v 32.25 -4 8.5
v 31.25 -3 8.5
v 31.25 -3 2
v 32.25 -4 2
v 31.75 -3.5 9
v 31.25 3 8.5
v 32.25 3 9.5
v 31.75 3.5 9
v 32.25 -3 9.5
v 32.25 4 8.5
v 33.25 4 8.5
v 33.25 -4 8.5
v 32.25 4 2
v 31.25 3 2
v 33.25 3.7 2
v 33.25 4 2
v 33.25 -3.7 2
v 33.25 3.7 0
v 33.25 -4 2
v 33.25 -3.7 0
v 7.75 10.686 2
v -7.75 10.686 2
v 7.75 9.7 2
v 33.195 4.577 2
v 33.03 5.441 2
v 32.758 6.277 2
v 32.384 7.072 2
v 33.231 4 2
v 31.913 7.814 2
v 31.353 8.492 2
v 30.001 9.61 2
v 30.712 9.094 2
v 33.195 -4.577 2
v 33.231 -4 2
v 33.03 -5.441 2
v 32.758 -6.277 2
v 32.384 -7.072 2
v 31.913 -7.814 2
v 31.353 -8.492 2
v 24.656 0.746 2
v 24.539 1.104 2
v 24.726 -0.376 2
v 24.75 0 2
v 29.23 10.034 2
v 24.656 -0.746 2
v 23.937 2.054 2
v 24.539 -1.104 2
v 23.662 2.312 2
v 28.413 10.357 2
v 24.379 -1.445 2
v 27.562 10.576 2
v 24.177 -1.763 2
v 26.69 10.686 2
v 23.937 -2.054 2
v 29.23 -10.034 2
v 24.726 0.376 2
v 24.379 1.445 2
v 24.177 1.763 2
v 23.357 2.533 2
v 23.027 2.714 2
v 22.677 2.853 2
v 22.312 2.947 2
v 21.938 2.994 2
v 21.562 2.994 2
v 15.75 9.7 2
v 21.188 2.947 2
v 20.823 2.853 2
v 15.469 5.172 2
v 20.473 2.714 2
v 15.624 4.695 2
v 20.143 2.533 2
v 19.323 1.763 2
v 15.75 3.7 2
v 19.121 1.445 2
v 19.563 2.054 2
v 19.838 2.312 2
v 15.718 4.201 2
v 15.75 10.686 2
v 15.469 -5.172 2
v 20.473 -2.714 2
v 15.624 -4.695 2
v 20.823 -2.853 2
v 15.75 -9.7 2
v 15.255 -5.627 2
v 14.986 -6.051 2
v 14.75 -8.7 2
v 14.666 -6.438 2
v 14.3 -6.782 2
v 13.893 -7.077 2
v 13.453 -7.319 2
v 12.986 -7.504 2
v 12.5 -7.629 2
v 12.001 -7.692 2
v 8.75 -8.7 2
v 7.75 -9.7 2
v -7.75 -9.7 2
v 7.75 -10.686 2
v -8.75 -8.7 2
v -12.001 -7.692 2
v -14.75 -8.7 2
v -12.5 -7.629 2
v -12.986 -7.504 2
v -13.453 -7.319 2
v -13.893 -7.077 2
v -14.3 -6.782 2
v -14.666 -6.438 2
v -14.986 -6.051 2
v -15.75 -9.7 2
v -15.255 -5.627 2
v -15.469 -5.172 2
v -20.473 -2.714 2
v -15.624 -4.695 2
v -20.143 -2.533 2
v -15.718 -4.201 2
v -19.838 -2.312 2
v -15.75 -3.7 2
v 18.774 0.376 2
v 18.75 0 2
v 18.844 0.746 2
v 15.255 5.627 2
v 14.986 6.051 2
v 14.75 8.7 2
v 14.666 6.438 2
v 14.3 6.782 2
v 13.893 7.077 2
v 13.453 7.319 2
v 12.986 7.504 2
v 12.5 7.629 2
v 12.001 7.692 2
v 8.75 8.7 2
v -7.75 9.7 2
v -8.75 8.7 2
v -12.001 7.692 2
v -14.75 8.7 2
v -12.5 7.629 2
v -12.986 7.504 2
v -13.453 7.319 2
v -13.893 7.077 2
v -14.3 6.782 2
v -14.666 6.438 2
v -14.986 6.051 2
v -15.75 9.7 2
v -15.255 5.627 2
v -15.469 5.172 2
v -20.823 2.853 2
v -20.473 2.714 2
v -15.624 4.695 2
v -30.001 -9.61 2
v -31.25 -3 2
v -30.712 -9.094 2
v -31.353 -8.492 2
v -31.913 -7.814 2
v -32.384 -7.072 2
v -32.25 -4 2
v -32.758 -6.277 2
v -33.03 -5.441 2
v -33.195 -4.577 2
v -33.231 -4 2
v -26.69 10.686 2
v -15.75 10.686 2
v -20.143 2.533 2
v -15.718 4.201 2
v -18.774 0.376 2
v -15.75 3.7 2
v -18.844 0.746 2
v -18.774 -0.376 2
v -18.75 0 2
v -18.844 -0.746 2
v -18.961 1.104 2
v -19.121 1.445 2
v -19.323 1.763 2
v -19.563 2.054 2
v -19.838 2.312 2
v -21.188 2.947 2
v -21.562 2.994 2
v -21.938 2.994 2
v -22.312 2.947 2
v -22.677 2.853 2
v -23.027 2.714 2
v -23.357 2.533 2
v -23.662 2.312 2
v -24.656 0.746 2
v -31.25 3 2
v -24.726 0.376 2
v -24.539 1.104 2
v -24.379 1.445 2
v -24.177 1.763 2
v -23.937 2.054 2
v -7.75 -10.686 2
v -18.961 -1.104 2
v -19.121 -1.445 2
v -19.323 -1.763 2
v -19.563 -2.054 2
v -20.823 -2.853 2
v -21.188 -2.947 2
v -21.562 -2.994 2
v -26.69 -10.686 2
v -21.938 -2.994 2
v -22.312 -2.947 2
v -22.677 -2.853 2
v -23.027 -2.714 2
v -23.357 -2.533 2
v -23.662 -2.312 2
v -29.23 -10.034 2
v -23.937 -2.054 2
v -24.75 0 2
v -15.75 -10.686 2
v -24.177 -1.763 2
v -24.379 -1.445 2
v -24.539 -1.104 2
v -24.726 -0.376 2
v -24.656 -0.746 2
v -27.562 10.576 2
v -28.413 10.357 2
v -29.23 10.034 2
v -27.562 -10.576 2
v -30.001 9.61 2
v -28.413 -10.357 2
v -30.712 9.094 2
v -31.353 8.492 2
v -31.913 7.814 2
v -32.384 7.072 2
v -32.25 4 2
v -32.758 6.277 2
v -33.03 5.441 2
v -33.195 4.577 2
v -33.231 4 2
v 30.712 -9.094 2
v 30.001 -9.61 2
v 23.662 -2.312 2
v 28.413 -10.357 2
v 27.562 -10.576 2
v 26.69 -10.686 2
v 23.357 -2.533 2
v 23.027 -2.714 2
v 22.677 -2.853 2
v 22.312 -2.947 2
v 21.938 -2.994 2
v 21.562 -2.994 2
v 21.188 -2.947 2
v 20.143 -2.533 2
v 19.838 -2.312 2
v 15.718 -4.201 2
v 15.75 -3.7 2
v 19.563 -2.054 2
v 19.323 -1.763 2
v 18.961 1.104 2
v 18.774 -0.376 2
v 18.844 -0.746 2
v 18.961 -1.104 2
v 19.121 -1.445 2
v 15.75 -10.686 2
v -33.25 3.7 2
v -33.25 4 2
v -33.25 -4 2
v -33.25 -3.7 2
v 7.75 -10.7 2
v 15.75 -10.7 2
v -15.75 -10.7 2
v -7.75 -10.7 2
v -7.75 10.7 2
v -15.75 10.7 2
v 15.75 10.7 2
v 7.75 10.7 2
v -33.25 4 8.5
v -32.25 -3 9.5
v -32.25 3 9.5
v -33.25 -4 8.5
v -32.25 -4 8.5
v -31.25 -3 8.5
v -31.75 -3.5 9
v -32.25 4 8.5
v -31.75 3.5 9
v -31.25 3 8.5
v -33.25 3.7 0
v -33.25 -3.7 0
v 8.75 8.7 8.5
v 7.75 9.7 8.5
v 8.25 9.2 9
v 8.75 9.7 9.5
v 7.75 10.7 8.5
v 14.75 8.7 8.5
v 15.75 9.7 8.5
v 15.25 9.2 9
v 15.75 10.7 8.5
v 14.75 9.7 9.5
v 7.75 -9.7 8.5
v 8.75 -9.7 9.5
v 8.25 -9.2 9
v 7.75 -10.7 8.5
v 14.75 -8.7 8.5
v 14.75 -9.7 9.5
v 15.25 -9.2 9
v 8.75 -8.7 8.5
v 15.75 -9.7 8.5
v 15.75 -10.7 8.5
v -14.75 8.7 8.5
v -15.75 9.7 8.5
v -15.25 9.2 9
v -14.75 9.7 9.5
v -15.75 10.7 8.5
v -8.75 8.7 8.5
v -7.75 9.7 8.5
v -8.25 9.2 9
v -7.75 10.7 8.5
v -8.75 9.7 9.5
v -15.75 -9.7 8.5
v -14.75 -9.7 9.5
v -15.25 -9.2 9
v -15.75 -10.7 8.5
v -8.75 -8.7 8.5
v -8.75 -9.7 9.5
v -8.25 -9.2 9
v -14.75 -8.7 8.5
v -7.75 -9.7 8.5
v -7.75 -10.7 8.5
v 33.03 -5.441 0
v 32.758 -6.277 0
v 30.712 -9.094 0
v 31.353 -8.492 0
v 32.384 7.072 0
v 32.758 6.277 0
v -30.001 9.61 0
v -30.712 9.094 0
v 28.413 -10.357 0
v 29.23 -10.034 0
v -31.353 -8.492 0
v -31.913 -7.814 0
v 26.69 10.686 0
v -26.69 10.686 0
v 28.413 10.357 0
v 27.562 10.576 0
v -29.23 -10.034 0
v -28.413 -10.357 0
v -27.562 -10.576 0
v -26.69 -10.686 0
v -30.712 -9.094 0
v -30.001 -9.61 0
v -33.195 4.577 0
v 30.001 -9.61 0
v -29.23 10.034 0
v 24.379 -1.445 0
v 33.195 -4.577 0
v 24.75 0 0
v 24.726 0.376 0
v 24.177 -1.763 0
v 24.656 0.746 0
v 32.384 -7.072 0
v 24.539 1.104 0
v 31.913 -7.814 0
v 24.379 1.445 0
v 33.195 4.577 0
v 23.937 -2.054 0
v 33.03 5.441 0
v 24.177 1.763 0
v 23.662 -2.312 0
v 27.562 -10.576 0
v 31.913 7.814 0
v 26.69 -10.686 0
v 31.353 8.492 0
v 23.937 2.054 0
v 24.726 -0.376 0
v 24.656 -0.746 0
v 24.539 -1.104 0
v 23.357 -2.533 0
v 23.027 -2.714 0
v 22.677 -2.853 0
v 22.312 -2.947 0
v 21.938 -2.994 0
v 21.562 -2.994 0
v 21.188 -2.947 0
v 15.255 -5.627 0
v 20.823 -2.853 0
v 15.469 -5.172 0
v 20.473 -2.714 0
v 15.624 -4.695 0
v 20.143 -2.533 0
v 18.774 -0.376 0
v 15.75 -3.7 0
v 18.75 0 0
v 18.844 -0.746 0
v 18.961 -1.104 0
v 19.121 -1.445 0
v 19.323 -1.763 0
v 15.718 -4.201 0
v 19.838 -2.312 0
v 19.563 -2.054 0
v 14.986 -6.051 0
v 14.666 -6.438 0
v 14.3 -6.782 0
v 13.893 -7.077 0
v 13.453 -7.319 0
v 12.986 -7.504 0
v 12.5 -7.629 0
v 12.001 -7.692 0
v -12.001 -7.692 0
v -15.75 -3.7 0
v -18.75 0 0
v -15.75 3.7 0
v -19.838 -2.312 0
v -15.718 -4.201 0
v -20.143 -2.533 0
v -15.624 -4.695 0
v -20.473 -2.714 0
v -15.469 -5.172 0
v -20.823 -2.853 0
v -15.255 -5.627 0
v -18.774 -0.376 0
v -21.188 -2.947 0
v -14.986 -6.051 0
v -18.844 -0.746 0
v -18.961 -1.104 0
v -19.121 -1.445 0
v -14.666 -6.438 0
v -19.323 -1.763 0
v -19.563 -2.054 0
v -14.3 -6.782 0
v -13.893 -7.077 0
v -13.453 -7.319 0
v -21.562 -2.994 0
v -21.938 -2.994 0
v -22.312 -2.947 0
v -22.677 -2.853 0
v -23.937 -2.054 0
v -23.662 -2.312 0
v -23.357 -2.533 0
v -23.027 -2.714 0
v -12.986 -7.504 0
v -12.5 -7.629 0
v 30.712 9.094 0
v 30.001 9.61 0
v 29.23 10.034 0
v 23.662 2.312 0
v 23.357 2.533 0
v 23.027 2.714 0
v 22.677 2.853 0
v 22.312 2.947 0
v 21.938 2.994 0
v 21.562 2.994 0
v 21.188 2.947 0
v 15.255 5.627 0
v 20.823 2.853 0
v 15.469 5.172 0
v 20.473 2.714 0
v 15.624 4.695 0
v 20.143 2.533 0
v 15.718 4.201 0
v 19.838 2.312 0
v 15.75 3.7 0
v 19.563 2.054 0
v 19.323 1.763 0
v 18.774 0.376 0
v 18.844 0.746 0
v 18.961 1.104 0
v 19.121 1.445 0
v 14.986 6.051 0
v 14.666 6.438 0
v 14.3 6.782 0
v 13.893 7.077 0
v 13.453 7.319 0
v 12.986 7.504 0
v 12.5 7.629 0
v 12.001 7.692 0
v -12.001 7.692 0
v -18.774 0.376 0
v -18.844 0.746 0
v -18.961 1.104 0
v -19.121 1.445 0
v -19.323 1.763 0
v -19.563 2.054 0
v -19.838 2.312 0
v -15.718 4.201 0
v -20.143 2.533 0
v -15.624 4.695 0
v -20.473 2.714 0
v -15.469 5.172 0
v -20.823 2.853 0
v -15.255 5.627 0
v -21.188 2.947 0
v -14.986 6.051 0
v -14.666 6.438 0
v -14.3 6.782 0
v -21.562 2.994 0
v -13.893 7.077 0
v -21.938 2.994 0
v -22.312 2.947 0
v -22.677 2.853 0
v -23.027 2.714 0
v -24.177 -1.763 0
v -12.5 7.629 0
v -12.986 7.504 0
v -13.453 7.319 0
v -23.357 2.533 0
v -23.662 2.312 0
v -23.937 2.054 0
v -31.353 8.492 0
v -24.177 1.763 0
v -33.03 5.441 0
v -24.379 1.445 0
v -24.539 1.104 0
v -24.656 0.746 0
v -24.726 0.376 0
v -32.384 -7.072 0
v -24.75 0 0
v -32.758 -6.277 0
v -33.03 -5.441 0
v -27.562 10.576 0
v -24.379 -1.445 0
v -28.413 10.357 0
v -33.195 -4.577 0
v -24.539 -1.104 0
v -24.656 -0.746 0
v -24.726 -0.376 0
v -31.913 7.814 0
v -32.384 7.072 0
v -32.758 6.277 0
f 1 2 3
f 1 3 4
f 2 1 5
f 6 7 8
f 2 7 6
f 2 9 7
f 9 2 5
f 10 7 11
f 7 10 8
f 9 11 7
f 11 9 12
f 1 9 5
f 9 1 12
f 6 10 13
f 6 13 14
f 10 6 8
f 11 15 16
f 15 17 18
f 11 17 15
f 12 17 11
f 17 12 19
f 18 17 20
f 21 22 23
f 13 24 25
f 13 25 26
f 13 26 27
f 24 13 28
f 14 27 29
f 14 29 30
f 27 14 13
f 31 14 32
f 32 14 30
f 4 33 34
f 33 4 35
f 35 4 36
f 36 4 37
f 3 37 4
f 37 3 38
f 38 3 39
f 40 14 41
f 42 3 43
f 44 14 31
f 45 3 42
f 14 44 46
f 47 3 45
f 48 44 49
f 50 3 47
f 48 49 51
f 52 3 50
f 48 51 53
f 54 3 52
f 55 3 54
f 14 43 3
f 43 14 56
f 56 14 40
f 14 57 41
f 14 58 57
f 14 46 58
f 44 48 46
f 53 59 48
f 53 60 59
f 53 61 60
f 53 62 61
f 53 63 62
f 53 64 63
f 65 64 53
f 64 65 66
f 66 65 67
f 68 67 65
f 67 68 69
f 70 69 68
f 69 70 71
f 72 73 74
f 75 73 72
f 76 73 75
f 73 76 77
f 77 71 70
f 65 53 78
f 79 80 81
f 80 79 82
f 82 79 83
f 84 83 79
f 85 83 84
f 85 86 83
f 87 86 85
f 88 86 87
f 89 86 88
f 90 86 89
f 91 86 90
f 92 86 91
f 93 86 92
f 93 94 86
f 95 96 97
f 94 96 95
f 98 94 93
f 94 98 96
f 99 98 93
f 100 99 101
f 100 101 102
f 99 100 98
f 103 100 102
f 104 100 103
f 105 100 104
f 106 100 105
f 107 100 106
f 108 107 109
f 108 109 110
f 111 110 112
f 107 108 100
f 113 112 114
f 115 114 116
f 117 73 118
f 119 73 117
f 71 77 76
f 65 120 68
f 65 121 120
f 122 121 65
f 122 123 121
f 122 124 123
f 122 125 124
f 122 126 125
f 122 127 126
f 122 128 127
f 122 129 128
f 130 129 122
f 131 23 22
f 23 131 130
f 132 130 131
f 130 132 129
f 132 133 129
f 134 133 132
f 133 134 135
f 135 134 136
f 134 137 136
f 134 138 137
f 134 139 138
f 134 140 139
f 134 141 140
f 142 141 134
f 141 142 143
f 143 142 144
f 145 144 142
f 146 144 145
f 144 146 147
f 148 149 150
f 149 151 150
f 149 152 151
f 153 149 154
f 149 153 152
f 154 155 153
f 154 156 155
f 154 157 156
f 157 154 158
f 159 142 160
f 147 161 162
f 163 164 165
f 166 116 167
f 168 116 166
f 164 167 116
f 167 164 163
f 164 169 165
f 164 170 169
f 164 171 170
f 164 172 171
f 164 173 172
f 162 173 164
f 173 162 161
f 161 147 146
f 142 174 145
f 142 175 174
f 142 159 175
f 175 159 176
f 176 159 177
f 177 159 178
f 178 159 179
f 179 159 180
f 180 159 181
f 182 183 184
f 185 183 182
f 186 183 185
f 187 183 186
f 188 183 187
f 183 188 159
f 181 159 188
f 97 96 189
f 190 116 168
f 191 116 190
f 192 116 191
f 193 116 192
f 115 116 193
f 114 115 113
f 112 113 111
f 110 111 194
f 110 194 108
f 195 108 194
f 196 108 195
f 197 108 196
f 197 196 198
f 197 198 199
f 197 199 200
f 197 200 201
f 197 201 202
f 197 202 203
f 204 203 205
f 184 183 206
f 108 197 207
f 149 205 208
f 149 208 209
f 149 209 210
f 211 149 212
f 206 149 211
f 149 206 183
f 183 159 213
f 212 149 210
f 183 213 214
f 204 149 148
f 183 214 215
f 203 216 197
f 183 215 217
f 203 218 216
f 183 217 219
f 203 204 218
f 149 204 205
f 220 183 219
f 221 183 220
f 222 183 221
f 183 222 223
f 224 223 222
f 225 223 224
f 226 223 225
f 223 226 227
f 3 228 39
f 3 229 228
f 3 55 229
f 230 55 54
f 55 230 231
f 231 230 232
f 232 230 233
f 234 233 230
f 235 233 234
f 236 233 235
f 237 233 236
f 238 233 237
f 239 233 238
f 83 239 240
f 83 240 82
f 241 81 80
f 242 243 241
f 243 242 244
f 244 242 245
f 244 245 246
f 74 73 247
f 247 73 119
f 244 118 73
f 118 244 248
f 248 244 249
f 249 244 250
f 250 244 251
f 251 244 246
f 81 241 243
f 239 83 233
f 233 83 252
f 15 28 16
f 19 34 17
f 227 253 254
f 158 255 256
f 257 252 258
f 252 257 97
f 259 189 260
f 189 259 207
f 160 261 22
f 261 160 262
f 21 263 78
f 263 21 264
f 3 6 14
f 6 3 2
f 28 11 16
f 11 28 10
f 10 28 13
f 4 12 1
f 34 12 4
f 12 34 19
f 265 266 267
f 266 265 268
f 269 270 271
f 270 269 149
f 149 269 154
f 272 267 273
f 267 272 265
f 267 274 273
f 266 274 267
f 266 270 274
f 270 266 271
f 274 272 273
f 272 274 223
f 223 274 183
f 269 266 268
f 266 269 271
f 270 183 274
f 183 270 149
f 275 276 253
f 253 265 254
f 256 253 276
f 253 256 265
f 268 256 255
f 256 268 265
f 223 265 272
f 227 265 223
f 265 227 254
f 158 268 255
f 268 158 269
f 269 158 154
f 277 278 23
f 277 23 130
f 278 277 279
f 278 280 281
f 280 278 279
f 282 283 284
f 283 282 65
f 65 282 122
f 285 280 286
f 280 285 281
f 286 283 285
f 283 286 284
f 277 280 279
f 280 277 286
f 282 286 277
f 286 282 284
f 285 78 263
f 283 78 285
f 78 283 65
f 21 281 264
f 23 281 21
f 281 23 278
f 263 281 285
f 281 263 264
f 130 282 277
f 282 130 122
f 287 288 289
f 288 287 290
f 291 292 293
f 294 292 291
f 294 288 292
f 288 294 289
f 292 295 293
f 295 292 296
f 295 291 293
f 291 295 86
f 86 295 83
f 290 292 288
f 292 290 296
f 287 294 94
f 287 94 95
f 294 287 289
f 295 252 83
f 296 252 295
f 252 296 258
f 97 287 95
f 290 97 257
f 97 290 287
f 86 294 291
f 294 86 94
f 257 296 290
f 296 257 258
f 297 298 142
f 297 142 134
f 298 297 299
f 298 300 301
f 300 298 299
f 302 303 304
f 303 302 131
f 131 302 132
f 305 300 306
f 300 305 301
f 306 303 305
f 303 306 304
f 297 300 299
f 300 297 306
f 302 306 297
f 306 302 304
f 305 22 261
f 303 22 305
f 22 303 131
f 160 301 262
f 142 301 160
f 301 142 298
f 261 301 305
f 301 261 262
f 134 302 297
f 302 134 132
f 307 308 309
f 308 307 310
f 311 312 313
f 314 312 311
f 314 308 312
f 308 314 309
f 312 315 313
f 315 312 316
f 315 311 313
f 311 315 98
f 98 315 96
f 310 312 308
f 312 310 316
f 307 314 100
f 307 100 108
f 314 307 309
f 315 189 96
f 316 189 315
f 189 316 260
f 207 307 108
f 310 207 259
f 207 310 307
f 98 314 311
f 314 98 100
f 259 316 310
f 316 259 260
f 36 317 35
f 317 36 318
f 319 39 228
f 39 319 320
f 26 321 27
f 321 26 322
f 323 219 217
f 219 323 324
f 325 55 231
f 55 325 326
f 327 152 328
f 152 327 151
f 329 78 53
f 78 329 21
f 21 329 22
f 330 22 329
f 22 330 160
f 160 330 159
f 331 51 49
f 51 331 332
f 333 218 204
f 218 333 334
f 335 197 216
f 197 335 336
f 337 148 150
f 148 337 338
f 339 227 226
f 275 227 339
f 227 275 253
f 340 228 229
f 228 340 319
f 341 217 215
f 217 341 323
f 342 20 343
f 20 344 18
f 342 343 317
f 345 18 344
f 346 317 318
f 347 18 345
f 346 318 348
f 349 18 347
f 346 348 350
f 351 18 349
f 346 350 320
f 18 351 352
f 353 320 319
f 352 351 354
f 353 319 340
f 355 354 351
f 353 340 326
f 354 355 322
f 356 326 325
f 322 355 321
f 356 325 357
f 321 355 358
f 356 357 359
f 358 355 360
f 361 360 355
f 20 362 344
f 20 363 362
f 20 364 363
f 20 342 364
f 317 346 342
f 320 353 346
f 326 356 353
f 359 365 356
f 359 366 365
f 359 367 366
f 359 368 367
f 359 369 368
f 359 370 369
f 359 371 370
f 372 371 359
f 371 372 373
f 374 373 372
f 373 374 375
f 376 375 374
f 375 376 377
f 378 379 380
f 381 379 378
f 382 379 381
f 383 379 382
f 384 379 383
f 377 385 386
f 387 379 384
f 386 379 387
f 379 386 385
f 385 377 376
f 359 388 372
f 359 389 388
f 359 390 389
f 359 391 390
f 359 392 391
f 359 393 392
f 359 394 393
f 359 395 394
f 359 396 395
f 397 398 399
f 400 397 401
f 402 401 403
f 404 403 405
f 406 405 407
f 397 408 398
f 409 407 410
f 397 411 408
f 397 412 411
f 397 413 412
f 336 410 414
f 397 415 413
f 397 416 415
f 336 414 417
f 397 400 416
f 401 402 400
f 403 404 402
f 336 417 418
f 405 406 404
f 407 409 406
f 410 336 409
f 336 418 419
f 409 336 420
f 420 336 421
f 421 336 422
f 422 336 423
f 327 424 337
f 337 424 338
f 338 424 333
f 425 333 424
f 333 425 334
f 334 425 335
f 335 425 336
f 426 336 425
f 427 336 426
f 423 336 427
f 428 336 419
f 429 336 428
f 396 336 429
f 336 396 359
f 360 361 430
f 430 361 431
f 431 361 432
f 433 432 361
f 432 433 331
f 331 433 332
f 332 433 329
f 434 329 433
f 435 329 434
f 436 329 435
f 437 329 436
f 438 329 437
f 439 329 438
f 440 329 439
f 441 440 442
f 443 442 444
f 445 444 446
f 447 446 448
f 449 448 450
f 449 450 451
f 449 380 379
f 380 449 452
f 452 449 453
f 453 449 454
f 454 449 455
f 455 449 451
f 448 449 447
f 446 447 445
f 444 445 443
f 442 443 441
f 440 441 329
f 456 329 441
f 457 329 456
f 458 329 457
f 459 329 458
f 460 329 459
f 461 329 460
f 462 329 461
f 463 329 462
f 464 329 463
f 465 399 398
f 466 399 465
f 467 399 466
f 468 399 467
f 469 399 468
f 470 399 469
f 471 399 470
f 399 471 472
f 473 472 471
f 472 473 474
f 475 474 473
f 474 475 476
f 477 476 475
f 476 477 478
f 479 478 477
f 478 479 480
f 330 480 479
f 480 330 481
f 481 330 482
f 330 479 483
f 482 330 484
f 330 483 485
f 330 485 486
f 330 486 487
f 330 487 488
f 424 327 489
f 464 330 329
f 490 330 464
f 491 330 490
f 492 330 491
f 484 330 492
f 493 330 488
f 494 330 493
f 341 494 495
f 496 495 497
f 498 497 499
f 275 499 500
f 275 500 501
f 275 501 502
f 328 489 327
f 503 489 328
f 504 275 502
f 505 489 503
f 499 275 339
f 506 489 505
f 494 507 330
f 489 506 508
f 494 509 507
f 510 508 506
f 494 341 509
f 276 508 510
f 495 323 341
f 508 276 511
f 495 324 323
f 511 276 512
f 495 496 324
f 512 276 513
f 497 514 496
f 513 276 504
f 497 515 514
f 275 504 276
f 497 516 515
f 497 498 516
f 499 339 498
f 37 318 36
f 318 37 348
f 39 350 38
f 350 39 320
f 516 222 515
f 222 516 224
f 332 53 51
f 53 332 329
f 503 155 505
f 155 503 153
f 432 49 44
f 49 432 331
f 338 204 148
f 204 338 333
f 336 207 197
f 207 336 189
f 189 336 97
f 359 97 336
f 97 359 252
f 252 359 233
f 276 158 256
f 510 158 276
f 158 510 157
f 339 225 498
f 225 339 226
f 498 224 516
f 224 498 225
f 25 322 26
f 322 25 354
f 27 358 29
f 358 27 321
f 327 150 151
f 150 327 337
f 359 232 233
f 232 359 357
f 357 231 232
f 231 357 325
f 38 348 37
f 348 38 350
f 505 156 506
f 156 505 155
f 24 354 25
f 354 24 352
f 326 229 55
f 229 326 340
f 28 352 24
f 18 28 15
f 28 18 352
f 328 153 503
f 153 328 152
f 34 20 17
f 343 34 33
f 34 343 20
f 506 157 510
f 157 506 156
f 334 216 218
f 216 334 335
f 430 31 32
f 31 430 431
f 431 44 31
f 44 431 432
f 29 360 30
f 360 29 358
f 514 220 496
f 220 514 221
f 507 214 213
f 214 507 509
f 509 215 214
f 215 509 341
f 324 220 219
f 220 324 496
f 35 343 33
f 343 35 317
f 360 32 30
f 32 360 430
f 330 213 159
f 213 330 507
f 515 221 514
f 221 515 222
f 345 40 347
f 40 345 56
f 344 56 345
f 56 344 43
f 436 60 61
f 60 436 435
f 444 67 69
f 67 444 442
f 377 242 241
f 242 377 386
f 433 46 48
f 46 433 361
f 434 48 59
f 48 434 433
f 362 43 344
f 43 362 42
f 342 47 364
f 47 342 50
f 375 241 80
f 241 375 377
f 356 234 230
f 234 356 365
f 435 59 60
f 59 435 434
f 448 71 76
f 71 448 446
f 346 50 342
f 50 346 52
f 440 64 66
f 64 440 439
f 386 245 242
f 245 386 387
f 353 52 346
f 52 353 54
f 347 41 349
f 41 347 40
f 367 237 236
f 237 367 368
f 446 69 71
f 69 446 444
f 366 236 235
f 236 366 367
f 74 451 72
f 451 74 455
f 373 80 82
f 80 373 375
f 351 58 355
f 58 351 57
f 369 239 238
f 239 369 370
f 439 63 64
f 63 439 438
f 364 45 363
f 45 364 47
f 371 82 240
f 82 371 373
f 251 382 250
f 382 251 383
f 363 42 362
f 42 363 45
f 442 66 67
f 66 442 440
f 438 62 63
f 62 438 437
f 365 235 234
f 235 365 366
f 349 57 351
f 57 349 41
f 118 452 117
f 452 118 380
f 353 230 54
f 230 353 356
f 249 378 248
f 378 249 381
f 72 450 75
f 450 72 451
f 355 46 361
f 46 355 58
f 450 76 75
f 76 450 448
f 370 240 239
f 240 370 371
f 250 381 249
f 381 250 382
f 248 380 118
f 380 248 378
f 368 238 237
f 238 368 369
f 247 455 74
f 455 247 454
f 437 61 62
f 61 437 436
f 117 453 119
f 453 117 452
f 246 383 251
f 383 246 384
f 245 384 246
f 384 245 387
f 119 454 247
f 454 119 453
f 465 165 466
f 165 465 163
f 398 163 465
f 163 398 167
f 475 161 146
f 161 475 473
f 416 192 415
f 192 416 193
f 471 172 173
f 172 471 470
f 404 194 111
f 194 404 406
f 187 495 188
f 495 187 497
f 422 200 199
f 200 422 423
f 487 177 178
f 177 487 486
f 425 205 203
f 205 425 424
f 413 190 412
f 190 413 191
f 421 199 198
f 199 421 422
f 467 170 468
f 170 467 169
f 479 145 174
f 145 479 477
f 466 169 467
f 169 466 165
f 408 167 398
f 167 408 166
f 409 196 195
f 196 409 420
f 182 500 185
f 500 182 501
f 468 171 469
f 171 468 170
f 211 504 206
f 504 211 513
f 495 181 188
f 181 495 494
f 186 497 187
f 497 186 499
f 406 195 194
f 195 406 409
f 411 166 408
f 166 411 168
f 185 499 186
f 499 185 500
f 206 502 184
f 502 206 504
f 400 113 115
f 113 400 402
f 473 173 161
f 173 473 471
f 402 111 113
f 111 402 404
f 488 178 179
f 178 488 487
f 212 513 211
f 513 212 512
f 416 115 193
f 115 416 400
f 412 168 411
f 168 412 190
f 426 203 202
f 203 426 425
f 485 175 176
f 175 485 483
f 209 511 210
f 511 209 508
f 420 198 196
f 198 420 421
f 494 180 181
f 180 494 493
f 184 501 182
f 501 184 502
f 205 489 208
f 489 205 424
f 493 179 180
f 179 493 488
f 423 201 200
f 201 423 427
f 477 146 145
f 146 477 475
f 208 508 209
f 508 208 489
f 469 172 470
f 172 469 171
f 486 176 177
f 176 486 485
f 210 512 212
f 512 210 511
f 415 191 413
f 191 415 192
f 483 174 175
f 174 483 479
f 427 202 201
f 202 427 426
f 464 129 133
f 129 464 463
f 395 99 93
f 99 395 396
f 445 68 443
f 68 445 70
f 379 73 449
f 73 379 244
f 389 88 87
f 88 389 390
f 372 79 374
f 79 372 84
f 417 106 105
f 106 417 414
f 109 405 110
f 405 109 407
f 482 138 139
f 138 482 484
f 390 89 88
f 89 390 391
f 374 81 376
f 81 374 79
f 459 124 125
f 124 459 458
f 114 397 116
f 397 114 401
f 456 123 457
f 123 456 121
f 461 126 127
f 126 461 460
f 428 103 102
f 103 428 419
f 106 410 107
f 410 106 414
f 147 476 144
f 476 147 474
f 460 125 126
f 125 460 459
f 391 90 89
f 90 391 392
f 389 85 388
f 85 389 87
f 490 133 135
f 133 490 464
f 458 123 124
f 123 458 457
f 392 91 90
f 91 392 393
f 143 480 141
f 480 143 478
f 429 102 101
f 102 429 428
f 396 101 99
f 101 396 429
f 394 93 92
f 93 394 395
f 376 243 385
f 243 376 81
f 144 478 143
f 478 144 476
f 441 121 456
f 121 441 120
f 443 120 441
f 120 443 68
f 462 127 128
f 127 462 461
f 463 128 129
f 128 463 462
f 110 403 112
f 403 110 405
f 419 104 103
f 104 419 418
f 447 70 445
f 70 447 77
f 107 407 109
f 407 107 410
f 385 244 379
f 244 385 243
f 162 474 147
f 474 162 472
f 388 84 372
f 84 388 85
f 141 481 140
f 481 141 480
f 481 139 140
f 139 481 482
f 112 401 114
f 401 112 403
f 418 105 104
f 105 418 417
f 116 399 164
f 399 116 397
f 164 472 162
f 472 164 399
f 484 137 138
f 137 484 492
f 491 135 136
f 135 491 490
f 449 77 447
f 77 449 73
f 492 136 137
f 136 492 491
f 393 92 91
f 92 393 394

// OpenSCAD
//This code uses the 'Chamfered primitives for OpenSCAD library, by SebiTimeWaster - https://github.com/SebiTimeWaster/Chamfers-for-OpenSCAD
//For the convenience of users, that code is included in this file, as noted in the lower part of this file
//For users wishing to link in the latest Chamfers-for-OpenSCAD code, the following line can be uncommented, and the included code at the bottom of this page can be commented out or removed.
//use <Chamfers-for-OpenSCAD/Chamfer.scad>;
    
$fn=50;

bolt_c_c = 43.5;        //center-to-center distance between bolts
bolt_shank_dia = 6;     //shank diameter of bolt (where bolting battery tray to quad frame) - make same diameter as bolt head for tray that will simply sit over bolt heads
bolt_head_dia = 6;      //bolt head diameter of bolt (where countersinking bolt, or making tray to sit over bolt head)
bolt_head_inset = 1;    //depth to countersink bolt head to (applicable if bolt shank and head settings are different diameters)
batt_len = 62.5;        //length of the battery, plus a mm or so of wiggle room
batt_w = 17.4;          //width of the battery, plus a mm or so of wiggle room
base_t = 2;             //thickness of the base plate
base_corner_r = 7;      //corner radius of plate external corners - must be a sensible value that works with plate width - some experimentation may be needed
finger_t = 2;           //thickness of battery holding fingers
finger_w = 8;           //width of battery holding fingers
finger_h = 7.5;         //height of battery holding fingers
hole_web_t = 3;         //width of side walls - should be at least as bit as finger_t parameter
center_hole_r = 4;      //inside corner radious of plate internal corners - must be a sensible value that works with plate width - some experimentation may be needed

difference() {
    union() {
        batt_base();
        batt_fingers();
    }
    
    bolt_holes();
    center_hole();
}



module batt_base() {
    hull() {
        translate([batt_len/2 - base_corner_r + finger_t, batt_w/2 - base_corner_r + finger_t, 0]) {
            cylinder(r=base_corner_r, h=base_t);
        }
        translate([batt_len/2 - base_corner_r + finger_t, -batt_w/2 + base_corner_r - finger_t, 0]) {
            cylinder(r=base_corner_r, h=base_t);
        }
        translate([-batt_len/2 + base_corner_r - finger_t, batt_w/2 - base_corner_r + finger_t, 0]) {
            cylinder(r=base_corner_r, h=base_t);
        }
        translate([-batt_len/2 + base_corner_r - finger_t, -batt_w/2 + base_corner_r - finger_t, 0]) {
            cylinder(r=base_corner_r, h=base_t);
        }
       }
}

module batt_fingers() {
    //end fingers
    translate([batt_len/2, -finger_w/2, base_t]) {
         chamferCube(finger_t, finger_w, finger_h, chamferHeight=1, chamferX = [0,0,1,1], chamferY = [0,1,1,0], chamferZ = [1,0,0,1]); 
    }
    translate([-batt_len/2 - finger_t, -finger_w/2, base_t]) {
        chamferCube(finger_t, finger_w, finger_h, chamferHeight=1, chamferX = [0,0,1,1], chamferY = [0,1,1,0], chamferZ = [0,1,1,0]); 
    }
    
    //side fingers
    translate([bolt_c_c/2 - bolt_shank_dia/2 - hole_web_t - finger_w, batt_w/2, base_t]) {
        chamferCube(finger_w, finger_t, finger_h, chamferHeight=1, chamferX = [0,0,1,1], chamferY = [0,1,1,0], chamferZ = [1,1,0,0]);
    }
    
    translate([bolt_c_c/2 - bolt_shank_dia/2 - hole_web_t - finger_w, -batt_w/2 - finger_t, base_t]) {
        chamferCube(finger_w, finger_t, finger_h, chamferHeight=1, chamferX = [0,0,1,1], chamferY = [0,1,1,0], chamferZ = [0,0,1,1]);
    }

    translate([-bolt_c_c/2 + bolt_shank_dia/2 + hole_web_t, batt_w/2, base_t]) {
        chamferCube(finger_w, finger_t, finger_h, chamferHeight=1, chamferX = [0,0,1,1], chamferY = [0,1,1,0], chamferZ = [1,1,0,0]);
    }
    
    translate([-bolt_c_c/2 + bolt_shank_dia/2 + hole_web_t, -batt_w/2 - finger_t, base_t]) {
        chamferCube(finger_w, finger_t, finger_h, chamferHeight=1, chamferX = [0,0,1,1], chamferY = [0,1,1,0], chamferZ = [0,0,1,1]);
    }
}

module center_hole() {
    hull() {
        translate([bolt_c_c/2 - bolt_shank_dia/2 - hole_web_t - center_hole_r, batt_w/2 - center_hole_r + finger_t - hole_web_t]) {
            cylinder(r=center_hole_r, h=base_t);
        }
        translate([bolt_c_c/2 - bolt_shank_dia/2 - hole_web_t - center_hole_r, -(batt_w/2 - center_hole_r + finger_t - hole_web_t), 0]) {
            cylinder(r=center_hole_r, h=base_t);
        }
        translate([-(bolt_c_c/2 - bolt_shank_dia/2 - hole_web_t - center_hole_r), batt_w/2 - center_hole_r + finger_t - hole_web_t, 0]) {
            cylinder(r=center_hole_r, h=base_t);
        }
        translate([-(bolt_c_c/2 - bolt_shank_dia/2 - hole_web_t - center_hole_r), -(batt_w/2 - center_hole_r + finger_t - hole_web_t), 0]) {
            cylinder(r=center_hole_r, h=base_t);
        }
    }
}

module bolt_holes() {
    translate([bolt_c_c/2, 0, 0]) {
        cylinder(d=bolt_shank_dia, h=base_t);
    }

    translate([-bolt_c_c/2, 0, 0]) {
        cylinder(d=bolt_shank_dia, h=base_t);
    }
    //bolt head holes
    translate([bolt_c_c/2, 0, base_t - bolt_head_inset]) {
        cylinder(d=bolt_head_dia, h=base_t);
    }

    translate([-bolt_c_c/2, 0,  base_t - bolt_head_inset]) {
        cylinder(d=bolt_head_dia, h=base_t);
    }
}

//vvvvvv SebiTimeWaster Chamfers-for-OpenSCAD code is included below, for end user convenience.
//       If desired, the following code can be commented out or removed, and the latest Chamfers-for-OpenSCAD code
//       can be linked in, via the 'use <Chamfers-for-OpenSCAD/Chamfer.scad>;' line near the top of this file
/**
  *  The MIT License (MIT)
  *
  *  "Chamfers for OpenSCAD" v0.31 Copyright (c) 2016 SebiTimeWaster
  *
  *  Permission is hereby granted, free of charge, to any person obtaining a copy
  *  of this software and associated documentation files (the "Software"), to deal
  *  in the Software without restriction, including without limitation the rights
  *  to use, copy, modify, merge, publish, distribute, sublicense, and/or sell
  *  copies of the Software, and to permit persons to whom the Software is
  *  furnished to do so, subject to the following conditions:
  *
  *  The above copyright notice and this permission notice shall be included in all
  *  copies or substantial portions of the Software.
  *
  *  THE SOFTWARE IS PROVIDED "AS IS", WITHOUT WARRANTY OF ANY KIND, EXPRESS OR
  *  IMPLIED, INCLUDING BUT NOT LIMITED TO THE WARRANTIES OF MERCHANTABILITY,
  *  FITNESS FOR A PARTICULAR PURPOSE AND NONINFRINGEMENT. IN NO EVENT SHALL THE
  *  AUTHORS OR COPYRIGHT HOLDERS BE LIABLE FOR ANY CLAIM, DAMAGES OR OTHER
  *  LIABILITY, WHETHER IN AN ACTION OF CONTRACT, TORT OR OTHERWISE, ARISING FROM,
  *  OUT OF OR IN CONNECTION WITH THE SOFTWARE OR THE USE OR OTHER DEALINGS IN THE
  *  SOFTWARE.
  */

/**
  * chamferCube returns an cube with 45° chamfers on the edges of the
  * cube. The chamfers are diectly printable on Fused deposition
  * modelling (FDM) printers without support structures.
  *
  * @param  sizeX          The size of the cube along the x axis
  * @param  sizeY          The size of the cube along the y axis
  * @param  sizeZ          The size of the cube along the z axis
  * @param  chamferHeight  The "height" of the chamfers as seen from
  *                        one of the dimensional planes (The real
  *                        width is side c in a right angled triangle)
  * @param  chamferX       Which chamfers to render along the x axis
  *                        in clockwise order starting from the zero
  *                        point, as seen from "Left view" (Ctrl + 6)
  * @param  chamferY       Which chamfers to render along the y axis
  *                        in clockwise order starting from the zero
  *                        point, as seen from "Front view" (Ctrl + 8)
  * @param  chamferZ       Which chamfers to render along the z axis
  *                        in clockwise order starting from the zero
  *                        point, as seen from "Bottom view" (Ctrl + 5)
  */
module chamferCube(sizeX, sizeY, sizeZ, chamferHeight = 1, chamferX = [1, 1, 1, 1], chamferY = [1, 1, 1, 1], chamferZ = [1, 1, 1, 1]) {
    chamferCLength = sqrt(chamferHeight * chamferHeight * 2);
    difference() {
        cube([sizeX, sizeY, sizeZ]);
        for(x = [0 : 3]) {
            chamferSide1 = min(x, 1) - floor(x / 3); // 0 1 1 0
            chamferSide2 = floor(x / 2); // 0 0 1 1
            if(chamferX[x]) {
                translate([-0.1, chamferSide1 * sizeY, -chamferHeight + chamferSide2 * sizeZ])
                rotate([45, 0, 0])
                cube([sizeX + 0.2, chamferCLength, chamferCLength]);
            }
            if(chamferY[x]) {
                translate([-chamferHeight + chamferSide2 * sizeX, -0.1, chamferSide1 * sizeZ])
                rotate([0, 45, 0])
                cube([chamferCLength, sizeY + 0.2, chamferCLength]);
            }
            if(chamferZ[x]) {
                translate([chamferSide1 * sizeX, -chamferHeight + chamferSide2 * sizeY, -0.1])
                rotate([0, 0, 45])
                cube([chamferCLength, chamferCLength, sizeZ + 0.2]);
            }
        }
    }
}

/**
  * chamferCylinder returns an cylinder or cone with 45° chamfers on
  * the edges of the cylinder. The chamfers are diectly printable on
  * Fused deposition modelling (FDM) printers without support structures.
  *
  * @param  height         Height of the cylinder
  * @param  radius         Radius of the cylinder (At the bottom)
  * @param  radius2        Radius of the cylinder (At the top)
  * @param  chamferHeight  The "height" of the chamfers as seen from
  *                        one of the dimensional planes (The real
  *                        width is side c in a right angled triangle)
  * @param  angle          The radius of the visible part of a wedge
  *                        starting from the x axis counter-clockwise
  * @param  quality        A circle quality factor where 1.0 is a fairly
  *                        good quality, range from 0.0 to 2.0
  */
module chamferCylinder(height, radius, radius2=undef, chamferHeight = 1, angle = 0, quality = -1.0) {
    radius2 = (radius2 == undef) ? radius : radius2;
    module cc() {
        if(chamferHeight != 0) {
            translate([0, 0, height - abs(chamferHeight)]) cylinder(abs(chamferHeight), r1 = radius2, r2 = radius2 - chamferHeight, $fn = circleSegments(radius2, quality));
        }
        translate([0, 0, abs(chamferHeight)]) cylinder(height - abs(chamferHeight) * 2, r1 = radius, r2 = radius2, $fn = circleSegments(max(radius, radius2), quality));
        if(chamferHeight != 0) {
            cylinder(abs(chamferHeight), r1 = radius - chamferHeight, r2 = radius, $fn = circleSegments(radius, quality));
        }
    }
    module box(brim = abs(min(chamferHeight, 0)) + 1) {
        translate([-radius - brim, 0, -brim]) cube([radius * 2 + brim * 2, radius + brim, height + brim * 2]);
    }
    module hcc() {
        intersection() {
            cc();
            box();
        }
    }
    if(angle <= 0 || angle >= 360) cc();
    else {
        if(angle > 180) hcc();
        difference() {
            if(angle <= 180) hcc();
            else rotate([0, 0, 180]) hcc();
            rotate([0, 0, angle]) box(abs(min(chamferHeight, 0)) + radius);
        }
    }
}

/**
  * circleSegments calculates the number of segments needed to maintain
  * a constant circle quality.
  * If a globalSegementsQuality variable exist it will overwrite the
  * standard quality setting (1.0). Order of usage is:
  * Standard (1.0) <- globalCircleQuality <- Quality parameter
  *
  * @param  r        Radius of the circle
  * @param  quality  A quality factor, where 1.0 is a fairly good
  *                  quality, range from 0.0 to 2.0
  *
  * @return  The number of segments for the circle
  */
function circleSegments(r, quality = -1.0) = (r * PI * 4 + 40) * ((quality >= 0.0) ? quality : globalCircleQuality);

// set global quality to 1.0, can be overridden by user
globalCircleQuality = 1.0;
//^^^^^ end of SebiTimeWaster's Chamfers-for-OpenSCAD code
